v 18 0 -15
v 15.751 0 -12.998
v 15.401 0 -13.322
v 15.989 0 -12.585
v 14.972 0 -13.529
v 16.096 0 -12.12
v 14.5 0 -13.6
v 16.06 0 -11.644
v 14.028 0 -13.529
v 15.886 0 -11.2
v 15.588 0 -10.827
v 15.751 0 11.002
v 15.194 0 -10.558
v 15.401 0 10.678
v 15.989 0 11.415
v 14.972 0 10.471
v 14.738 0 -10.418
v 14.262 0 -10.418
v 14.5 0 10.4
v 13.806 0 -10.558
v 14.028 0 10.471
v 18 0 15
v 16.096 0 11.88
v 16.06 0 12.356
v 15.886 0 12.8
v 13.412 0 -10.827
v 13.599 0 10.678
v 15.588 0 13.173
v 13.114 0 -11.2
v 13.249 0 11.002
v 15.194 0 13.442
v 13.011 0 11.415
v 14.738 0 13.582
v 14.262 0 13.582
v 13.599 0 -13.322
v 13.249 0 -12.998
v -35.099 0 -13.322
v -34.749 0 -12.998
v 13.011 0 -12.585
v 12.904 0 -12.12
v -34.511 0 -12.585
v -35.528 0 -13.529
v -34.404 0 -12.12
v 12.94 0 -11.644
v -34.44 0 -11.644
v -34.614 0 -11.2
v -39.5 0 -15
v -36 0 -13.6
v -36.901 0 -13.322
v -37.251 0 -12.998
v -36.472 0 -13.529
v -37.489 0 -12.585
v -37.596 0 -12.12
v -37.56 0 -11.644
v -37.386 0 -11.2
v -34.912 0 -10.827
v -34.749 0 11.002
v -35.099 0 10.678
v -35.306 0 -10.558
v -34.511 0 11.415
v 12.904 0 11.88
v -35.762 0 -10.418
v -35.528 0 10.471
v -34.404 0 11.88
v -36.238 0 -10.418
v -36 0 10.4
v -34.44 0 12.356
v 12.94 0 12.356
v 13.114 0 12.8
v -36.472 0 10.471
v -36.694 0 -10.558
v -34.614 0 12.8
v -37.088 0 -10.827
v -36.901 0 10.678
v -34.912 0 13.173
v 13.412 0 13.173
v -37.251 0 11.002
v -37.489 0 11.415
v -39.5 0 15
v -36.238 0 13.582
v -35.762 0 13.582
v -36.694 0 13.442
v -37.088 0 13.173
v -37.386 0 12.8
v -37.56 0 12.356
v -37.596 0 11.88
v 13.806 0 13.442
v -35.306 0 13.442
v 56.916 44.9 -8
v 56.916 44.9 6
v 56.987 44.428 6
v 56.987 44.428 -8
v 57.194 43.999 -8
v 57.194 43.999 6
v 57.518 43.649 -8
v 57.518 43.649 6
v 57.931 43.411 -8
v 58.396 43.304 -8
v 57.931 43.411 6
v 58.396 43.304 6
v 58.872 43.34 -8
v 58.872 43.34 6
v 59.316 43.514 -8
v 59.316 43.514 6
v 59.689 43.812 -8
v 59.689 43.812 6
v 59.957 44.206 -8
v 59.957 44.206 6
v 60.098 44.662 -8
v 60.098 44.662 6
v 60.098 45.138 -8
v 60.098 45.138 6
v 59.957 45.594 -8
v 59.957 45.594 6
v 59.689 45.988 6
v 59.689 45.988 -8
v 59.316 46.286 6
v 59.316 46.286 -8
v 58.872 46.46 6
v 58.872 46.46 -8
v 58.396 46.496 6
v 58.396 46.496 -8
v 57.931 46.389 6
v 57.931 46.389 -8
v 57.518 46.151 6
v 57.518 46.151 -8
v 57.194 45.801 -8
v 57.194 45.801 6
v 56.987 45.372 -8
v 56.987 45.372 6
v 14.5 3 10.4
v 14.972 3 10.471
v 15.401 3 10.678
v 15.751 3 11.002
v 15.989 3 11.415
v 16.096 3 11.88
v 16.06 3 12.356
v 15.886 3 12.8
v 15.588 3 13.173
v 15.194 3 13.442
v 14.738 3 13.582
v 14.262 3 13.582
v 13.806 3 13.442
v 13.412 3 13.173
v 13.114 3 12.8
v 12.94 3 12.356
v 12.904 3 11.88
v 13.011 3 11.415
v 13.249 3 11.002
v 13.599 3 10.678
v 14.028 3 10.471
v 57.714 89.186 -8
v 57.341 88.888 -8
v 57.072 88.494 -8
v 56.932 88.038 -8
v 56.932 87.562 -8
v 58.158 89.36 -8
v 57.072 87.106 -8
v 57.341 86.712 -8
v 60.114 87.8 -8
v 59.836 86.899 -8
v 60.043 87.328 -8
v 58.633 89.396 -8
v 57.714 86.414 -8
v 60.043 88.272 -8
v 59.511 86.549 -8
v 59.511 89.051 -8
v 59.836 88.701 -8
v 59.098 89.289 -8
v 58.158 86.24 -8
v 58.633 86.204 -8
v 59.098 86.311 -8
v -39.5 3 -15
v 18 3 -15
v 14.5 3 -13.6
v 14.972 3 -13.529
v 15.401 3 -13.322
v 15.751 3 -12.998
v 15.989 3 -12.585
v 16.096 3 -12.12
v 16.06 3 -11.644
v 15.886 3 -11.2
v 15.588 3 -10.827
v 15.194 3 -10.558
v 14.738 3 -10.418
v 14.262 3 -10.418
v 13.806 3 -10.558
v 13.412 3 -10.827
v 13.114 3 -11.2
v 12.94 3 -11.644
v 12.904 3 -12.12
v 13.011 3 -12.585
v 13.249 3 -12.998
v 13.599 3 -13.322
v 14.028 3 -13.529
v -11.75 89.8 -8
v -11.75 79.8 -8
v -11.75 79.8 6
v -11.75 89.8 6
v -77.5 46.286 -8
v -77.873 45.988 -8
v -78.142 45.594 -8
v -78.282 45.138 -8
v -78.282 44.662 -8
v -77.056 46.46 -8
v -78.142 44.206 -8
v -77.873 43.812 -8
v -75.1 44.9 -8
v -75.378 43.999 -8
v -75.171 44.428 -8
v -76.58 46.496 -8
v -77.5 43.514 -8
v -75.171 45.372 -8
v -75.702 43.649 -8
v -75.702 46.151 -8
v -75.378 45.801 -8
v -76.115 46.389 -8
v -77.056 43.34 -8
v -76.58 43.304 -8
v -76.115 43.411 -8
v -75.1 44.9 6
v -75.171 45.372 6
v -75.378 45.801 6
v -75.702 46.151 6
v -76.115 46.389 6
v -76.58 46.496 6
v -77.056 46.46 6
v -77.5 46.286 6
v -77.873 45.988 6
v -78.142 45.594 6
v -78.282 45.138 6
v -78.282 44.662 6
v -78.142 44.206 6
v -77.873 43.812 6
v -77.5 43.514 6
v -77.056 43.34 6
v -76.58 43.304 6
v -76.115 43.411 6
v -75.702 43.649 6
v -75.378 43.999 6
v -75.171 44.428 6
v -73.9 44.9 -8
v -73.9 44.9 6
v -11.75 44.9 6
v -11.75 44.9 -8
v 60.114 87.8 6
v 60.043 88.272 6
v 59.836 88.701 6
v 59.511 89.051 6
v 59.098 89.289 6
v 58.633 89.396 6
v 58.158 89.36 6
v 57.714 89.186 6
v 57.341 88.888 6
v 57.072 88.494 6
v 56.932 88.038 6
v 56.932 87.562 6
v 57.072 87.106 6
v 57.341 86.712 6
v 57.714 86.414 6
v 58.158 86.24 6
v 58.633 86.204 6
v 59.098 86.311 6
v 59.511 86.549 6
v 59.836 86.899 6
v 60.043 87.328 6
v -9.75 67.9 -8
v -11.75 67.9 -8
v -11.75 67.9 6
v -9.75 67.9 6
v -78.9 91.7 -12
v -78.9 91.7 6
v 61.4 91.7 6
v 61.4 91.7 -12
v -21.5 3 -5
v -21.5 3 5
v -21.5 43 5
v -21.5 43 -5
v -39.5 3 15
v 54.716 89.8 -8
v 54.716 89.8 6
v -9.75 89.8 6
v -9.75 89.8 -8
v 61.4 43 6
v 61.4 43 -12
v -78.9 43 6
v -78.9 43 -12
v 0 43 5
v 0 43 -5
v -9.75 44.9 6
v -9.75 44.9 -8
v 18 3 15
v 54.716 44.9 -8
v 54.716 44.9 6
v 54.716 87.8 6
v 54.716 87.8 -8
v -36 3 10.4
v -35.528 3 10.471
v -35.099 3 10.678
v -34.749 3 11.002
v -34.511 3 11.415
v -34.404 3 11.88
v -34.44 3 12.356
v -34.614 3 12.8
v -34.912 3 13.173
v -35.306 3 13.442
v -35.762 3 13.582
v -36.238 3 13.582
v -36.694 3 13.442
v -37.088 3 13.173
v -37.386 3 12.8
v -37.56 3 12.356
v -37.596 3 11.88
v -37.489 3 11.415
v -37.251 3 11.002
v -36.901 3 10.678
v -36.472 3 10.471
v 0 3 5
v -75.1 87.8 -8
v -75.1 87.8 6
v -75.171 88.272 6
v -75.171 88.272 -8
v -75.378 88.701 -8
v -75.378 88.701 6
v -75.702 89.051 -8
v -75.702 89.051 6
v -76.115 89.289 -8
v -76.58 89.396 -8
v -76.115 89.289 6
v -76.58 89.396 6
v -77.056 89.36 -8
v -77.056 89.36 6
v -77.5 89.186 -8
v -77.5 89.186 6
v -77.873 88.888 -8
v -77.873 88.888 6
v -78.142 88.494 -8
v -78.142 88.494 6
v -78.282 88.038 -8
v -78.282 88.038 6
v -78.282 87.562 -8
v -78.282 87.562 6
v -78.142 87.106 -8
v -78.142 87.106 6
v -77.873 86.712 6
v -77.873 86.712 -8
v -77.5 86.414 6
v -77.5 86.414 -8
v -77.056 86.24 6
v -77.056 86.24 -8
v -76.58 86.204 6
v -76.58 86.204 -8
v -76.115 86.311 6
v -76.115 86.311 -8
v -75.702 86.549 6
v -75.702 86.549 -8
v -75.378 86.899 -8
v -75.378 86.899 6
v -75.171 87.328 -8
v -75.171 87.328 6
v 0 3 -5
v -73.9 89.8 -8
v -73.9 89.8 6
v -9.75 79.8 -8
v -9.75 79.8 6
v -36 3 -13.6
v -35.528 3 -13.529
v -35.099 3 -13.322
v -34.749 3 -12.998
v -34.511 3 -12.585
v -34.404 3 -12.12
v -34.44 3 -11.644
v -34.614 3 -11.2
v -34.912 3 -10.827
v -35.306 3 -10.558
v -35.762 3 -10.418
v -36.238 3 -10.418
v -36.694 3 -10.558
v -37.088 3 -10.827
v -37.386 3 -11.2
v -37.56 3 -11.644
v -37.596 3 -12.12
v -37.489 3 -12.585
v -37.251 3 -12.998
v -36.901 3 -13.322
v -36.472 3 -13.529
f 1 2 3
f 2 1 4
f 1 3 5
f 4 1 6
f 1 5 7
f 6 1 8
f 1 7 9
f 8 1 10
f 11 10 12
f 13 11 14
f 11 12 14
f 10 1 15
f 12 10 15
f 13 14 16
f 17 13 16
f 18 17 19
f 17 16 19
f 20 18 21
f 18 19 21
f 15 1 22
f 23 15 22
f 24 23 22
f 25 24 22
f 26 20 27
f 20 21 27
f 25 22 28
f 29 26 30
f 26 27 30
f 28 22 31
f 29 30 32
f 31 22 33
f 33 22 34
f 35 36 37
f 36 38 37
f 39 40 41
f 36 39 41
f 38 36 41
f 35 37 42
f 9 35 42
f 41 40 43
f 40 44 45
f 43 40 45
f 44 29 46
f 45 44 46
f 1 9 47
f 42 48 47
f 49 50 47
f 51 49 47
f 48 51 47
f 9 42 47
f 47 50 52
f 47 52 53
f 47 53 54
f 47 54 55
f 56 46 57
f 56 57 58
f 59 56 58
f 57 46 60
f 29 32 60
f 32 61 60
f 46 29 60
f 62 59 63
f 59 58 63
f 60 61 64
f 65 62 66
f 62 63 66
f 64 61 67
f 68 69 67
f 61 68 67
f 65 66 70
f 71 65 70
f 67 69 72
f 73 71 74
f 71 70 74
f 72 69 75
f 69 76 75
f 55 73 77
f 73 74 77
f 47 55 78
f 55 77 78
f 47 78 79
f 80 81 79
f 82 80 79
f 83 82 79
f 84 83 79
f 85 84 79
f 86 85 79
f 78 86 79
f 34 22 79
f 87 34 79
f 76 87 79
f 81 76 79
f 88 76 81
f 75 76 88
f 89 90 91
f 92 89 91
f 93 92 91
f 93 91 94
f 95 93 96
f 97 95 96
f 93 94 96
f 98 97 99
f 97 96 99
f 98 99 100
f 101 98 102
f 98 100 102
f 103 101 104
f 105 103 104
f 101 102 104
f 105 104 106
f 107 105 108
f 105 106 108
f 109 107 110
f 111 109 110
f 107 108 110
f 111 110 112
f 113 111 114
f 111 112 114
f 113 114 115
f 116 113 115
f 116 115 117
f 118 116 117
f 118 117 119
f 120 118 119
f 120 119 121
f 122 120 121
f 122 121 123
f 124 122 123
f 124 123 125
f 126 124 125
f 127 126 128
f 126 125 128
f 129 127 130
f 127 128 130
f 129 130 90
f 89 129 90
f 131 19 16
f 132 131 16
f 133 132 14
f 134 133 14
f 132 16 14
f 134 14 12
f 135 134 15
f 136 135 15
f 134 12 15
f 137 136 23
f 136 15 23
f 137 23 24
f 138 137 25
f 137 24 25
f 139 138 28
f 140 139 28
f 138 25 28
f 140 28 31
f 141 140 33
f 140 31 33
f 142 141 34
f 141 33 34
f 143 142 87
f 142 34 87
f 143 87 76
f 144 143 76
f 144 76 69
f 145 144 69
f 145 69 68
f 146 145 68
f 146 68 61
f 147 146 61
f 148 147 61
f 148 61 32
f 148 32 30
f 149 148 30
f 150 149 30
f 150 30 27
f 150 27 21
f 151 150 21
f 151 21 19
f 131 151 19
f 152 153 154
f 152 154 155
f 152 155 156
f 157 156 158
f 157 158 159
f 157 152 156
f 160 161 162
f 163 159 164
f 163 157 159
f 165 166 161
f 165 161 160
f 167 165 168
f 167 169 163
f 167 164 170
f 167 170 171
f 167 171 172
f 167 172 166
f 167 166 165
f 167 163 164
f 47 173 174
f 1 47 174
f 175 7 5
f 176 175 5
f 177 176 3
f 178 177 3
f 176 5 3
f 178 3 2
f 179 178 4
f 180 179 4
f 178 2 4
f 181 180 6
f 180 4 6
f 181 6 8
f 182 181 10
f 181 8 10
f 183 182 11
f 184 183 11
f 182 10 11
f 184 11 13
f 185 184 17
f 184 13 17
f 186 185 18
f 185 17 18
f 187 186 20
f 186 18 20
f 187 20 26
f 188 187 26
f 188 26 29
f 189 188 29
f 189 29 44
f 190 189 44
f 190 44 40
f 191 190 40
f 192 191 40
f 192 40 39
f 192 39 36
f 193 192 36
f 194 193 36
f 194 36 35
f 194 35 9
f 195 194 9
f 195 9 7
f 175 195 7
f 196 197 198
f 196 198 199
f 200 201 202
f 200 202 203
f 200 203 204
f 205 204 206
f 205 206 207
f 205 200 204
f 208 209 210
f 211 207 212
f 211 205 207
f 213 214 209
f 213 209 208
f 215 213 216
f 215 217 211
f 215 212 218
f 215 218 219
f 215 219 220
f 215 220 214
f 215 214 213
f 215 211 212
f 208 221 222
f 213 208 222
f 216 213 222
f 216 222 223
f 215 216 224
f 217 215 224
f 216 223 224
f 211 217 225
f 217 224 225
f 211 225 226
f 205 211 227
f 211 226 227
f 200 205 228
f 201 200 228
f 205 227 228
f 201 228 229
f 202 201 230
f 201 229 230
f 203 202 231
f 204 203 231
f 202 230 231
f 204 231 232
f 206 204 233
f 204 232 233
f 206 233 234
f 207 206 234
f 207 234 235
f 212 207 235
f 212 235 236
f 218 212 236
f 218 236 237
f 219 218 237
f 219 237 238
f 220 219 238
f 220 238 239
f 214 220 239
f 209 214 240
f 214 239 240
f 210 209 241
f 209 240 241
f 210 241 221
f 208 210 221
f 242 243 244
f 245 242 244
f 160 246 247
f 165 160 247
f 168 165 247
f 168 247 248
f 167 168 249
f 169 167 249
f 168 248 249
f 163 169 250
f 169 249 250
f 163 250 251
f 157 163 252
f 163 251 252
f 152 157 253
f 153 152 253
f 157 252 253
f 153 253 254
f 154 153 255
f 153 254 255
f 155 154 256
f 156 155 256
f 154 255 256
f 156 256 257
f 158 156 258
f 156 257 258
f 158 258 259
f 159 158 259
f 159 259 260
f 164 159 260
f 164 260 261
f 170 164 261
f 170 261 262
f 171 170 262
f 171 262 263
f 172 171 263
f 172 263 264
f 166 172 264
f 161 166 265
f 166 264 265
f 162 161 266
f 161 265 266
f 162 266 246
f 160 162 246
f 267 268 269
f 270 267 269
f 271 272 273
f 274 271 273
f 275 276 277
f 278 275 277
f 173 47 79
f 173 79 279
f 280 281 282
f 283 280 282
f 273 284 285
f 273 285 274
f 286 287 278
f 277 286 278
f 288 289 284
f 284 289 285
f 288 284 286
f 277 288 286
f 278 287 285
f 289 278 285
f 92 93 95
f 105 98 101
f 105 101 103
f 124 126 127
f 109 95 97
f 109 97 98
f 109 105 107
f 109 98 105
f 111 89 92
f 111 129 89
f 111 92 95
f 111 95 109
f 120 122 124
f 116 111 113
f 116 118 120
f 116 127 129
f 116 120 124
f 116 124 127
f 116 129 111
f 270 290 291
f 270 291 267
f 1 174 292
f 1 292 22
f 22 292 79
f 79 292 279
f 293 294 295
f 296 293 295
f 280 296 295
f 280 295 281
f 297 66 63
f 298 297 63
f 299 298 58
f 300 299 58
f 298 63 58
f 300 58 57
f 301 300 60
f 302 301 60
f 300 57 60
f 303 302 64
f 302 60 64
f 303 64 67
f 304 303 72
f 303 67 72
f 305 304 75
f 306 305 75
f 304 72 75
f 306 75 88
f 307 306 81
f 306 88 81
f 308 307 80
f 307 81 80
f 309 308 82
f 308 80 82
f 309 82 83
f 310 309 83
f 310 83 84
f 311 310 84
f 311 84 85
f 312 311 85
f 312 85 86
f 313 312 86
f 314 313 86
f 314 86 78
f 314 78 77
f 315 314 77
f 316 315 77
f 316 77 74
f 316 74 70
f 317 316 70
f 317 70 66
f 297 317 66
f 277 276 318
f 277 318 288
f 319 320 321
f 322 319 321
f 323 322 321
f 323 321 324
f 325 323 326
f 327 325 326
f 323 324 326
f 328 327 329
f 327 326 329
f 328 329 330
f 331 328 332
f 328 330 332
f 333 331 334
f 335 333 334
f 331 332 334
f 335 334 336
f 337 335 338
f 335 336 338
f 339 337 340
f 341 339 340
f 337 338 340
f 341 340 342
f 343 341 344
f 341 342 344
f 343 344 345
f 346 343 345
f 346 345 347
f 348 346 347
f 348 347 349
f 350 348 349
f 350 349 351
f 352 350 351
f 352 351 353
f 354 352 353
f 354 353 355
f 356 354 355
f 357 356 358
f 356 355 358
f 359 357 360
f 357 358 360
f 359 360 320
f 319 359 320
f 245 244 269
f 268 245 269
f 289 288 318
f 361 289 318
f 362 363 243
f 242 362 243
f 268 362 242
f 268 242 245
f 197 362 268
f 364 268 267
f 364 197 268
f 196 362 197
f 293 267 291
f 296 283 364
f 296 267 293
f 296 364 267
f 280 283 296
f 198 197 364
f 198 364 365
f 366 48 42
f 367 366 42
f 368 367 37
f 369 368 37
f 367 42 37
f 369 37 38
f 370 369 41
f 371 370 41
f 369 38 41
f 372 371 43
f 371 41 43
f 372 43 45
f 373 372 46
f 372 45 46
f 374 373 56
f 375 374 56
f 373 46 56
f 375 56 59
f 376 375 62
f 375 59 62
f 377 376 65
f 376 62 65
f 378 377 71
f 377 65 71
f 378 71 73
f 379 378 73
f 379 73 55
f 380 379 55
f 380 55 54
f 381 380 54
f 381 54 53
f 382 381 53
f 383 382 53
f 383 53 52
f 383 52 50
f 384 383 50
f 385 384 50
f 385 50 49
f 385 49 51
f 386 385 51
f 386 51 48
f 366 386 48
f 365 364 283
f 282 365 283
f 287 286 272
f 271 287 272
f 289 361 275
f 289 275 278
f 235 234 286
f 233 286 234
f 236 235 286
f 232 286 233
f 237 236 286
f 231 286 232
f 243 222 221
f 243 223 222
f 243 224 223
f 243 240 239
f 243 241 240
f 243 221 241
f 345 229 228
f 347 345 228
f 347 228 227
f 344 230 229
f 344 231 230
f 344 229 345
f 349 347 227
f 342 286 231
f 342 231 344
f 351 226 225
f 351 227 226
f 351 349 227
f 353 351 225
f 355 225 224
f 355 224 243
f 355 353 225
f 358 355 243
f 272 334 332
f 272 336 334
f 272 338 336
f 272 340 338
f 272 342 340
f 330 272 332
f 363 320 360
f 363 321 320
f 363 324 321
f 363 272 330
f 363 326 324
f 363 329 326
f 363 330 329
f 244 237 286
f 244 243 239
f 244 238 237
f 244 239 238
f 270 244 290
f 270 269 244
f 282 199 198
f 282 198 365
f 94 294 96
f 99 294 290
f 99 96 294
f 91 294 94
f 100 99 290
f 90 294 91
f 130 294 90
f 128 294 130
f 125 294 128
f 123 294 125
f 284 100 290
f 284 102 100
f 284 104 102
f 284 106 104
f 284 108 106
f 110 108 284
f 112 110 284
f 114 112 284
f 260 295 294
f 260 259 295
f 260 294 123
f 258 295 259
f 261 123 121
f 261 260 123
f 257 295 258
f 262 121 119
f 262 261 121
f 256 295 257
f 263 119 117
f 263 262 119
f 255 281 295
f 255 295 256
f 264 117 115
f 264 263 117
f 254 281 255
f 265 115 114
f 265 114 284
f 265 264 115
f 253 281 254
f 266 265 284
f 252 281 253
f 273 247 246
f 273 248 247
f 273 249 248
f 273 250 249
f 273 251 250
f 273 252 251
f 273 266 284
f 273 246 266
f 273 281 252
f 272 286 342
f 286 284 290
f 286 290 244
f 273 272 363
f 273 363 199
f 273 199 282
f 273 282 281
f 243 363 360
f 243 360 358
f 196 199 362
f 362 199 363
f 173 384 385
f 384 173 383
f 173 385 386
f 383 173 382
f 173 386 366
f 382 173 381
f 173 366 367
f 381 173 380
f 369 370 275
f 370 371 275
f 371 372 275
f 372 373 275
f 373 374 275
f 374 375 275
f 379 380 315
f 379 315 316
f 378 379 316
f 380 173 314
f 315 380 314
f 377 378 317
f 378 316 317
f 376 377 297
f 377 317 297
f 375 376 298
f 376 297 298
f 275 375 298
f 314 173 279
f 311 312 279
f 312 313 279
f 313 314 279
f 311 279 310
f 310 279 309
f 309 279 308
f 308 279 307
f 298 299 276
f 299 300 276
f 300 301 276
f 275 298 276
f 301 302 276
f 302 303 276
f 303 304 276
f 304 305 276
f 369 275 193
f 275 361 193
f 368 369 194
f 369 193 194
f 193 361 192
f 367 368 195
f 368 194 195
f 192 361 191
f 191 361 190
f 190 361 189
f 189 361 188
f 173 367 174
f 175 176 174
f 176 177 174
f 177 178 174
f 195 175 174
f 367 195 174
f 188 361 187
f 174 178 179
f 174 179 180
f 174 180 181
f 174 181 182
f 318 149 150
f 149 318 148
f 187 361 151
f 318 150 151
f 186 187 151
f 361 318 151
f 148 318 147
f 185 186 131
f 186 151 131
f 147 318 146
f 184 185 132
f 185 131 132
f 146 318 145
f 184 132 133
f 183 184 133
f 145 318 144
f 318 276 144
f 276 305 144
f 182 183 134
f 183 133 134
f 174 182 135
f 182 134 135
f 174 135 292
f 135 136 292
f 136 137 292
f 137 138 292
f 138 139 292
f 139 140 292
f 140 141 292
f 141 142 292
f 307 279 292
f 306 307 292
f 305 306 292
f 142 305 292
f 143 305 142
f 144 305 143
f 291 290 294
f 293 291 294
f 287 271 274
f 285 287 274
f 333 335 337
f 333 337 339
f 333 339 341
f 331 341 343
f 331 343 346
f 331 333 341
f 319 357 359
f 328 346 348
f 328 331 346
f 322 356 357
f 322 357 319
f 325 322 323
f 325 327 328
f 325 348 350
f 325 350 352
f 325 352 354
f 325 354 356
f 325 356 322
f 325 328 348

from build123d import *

# Parameters (mm, degrees)
SKETCH_1_W               = 126.3
SKETCH_1_H               = 42.9
SKETCH_1_W_2             = 2
SKETCH_1_W_3             = 62.15
EXTRUDE_6_DEPTH          = 15
SKETCH_2_W               = 62.15
SKETCH_2_H               = 42.9
CUT_EXTRUDE_1_DEPTH      = 23
SKETCH_4_W               = 10
SKETCH_4_H               = 40
CUT_EXTRUDE_2_DEPTH      = 159.899905601
CUT_EXTRUDE_3_DEPTH      = 119.456321064
CUT_EXTRUDE_3_DEPTH_BACK = 119.456321064
SKETCH_5_W               = 10
SKETCH_5_H               = 40
CUT_EXTRUDE_4_DEPTH      = 159.899905601
CUT_EXTRUDE_4_DEPTH_BACK = 159.899905601
SKETCH_6_W               = 9
SKETCH_6_H               = 46.7
SKETCH_7_W               = 14
SKETCH_7_H               = 11.9
CUT_EXTRUDE_5_DEPTH      = 23
SKETCH_9_R               = 1.6
CUT_EXTRUDE_6_DEPTH      = 10
CUT_EXTRUDE_7_DEPTH      = 159.899905601
CUT_EXTRUDE_7_DEPTH_BACK = 159.899905601
SKETCH_11_W              = 3
SKETCH_11_H              = 46.7
SKETCH_14_W              = 7
SKETCH_14_H              = 18
EXTRUDE_8_DEPTH          = 46.7
SKETCH_15_W              = 2.315581883
SKETCH_15_H              = 42.9
SKETCH_15_R              = 1.6
CUT_EXTRUDE_9_DEPTH      = 14
SKETCH_19_W              = 3
SKETCH_19_H              = 18
EXTRUDE_9_DEPTH          = 46.7
SKETCH_20_W              = 140.3
SKETCH_20_H              = 2
EXTRUDE_10_DEPTH         = 18
SKETCH_21_R              = 1.6
CUT_EXTRUDE_13_DEPTH     = 14
SKETCH_23_W              = 2
SKETCH_23_H              = 2
EXTRUDE_11_DEPTH         = 14


with BuildPart() as part:
    # 草图1 → 凸台-拉伸6 (new, symmetric)
    # profile 1 of 4: a face of its own
    with BuildSketch(Plane.XY):
        Polygon((-39.5, 0), (-39.5, 3), (-21.5, 3), (-21.5, 43), (-75.9, 43), (-75.9, 89.7), (54.4, 89.7), (54.4, 43), (0, 43), (0, 3), (18, 3), (18, 0), align=None)
        with Locations((-10.75, 66.35)):
            Rectangle(SKETCH_1_W, SKETCH_1_H, mode=Mode.SUBTRACT)
    # profile 2 of 4: a face of its own
    with BuildSketch(Plane.XY):
        with Locations((-10.75, 66.35)):
            Rectangle(SKETCH_1_W_2, SKETCH_1_H)
    # profile 3 of 4: a face of its own
    with BuildSketch(Plane.XY):
        with Locations((21.325, 66.35)):
            Rectangle(SKETCH_1_W_3, SKETCH_1_H)
    # profile 4 of 4: a face of its own
    with BuildSketch(Plane.XY):
        with Locations((-42.825, 66.35)):
            Rectangle(SKETCH_1_W_3, SKETCH_1_H)
    extrude(amount=EXTRUDE_6_DEPTH, both=True)

    # 草图2 → 切除-拉伸1 (cut)
    with BuildSketch(Plane.XY.offset(15)):
        with Locations((-42.825, 66.35)):
            Rectangle(SKETCH_2_W, SKETCH_2_H)
        with Locations((21.325, 66.35)):
            Rectangle(SKETCH_2_W, SKETCH_2_H)
    extrude(amount=-CUT_EXTRUDE_1_DEPTH, mode=Mode.SUBTRACT)

    # 草图4 → 切除-拉伸2 (cut, through all)
    with BuildSketch(Plane.ZY.offset(75.9)):
        with Locations((10, 23)):
            Rectangle(SKETCH_4_W, SKETCH_4_H)
    extrude(amount=-CUT_EXTRUDE_2_DEPTH, mode=Mode.SUBTRACT)

    # 草图5 → 切除-拉伸3 (cut, two sides: drawn at the far end of the back side and taken through both)
    with BuildSketch(Plane.ZY.offset(21.5).offset(-CUT_EXTRUDE_3_DEPTH_BACK)):
        with Locations((-10, 23)):
            Rectangle(SKETCH_5_W, SKETCH_5_H)
    extrude(amount=CUT_EXTRUDE_3_DEPTH + CUT_EXTRUDE_3_DEPTH_BACK, mode=Mode.SUBTRACT)

    # 草图6 → 切除-拉伸4 (cut, two sides: drawn at the far end of the back side and taken through both)
    with BuildSketch(Plane.ZY.offset(75.9).offset(-CUT_EXTRUDE_4_DEPTH_BACK)):
        with Locations((10.5, 66.35)):
            Rectangle(SKETCH_6_W, SKETCH_6_H)
    extrude(amount=CUT_EXTRUDE_4_DEPTH + CUT_EXTRUDE_4_DEPTH_BACK, mode=Mode.SUBTRACT)

    # 草图7 → 切除-拉伸5 (cut)
    with BuildSketch(Plane.ZY.offset(11.75)):
        with Locations((-1, 73.85)):
            Rectangle(SKETCH_7_W, SKETCH_7_H)
    extrude(amount=-CUT_EXTRUDE_5_DEPTH, mode=Mode.SUBTRACT)

    # 草图9 → 切除-拉伸6 (cut)
    with BuildSketch(Plane.XZ):
        with Locations(Location((-36, 12, 0), (0, 0, 270))):
            Circle(SKETCH_9_R)
        with Locations(Location((-36, -12, 0), (0, 0, 270))):
            Circle(SKETCH_9_R)
        with Locations(Location((14.5, 12, 0), (0, 0, 270))):
            Circle(SKETCH_9_R)
        with Locations(Location((14.5, -12, 0), (0, 0, 270))):
            Circle(SKETCH_9_R)
    extrude(amount=-CUT_EXTRUDE_6_DEPTH, mode=Mode.SUBTRACT)

    # 草图11 → 切除-拉伸7 (cut, two sides: drawn at the far end of the back side and taken through both)
    with BuildSketch(Plane.ZY.offset(75.9).offset(-CUT_EXTRUDE_7_DEPTH_BACK)):
        with Locations((-13.5, 66.35)):
            Rectangle(SKETCH_11_W, SKETCH_11_H)
    extrude(amount=CUT_EXTRUDE_7_DEPTH + CUT_EXTRUDE_7_DEPTH_BACK, mode=Mode.SUBTRACT)

    # 草图14 → 凸台-拉伸8 (add)
    with BuildSketch(Plane(origin=(0, 89.7, 0), x_dir=(1, 0, 0), z_dir=(0, 1, 0))):
        with Locations((57.9, 3)):
            Rectangle(SKETCH_14_W, SKETCH_14_H)
    extrude(amount=-EXTRUDE_8_DEPTH)

    # 草图15 → 切除-拉伸9 (cut)
    with BuildSketch(Plane.XY.offset(6)):
        with BuildLine():
            ThreePointArc((60.11573898, 44.9), (58.51573898, 46.5), (56.91573898, 44.9))
            ThreePointArc((56.91573898, 44.9), (58.51573898, 43.3), (60.11573898, 44.9))
        make_face()
        with Locations((53.557790942, 66.35)):
            Rectangle(SKETCH_15_W, SKETCH_15_H)
        Polygon((52.4, 44.9), (52.4, 87.8), (-9.75, 87.8), (-9.75, 79.8), (-11.75, 79.8), (-11.75, 87.8), (-73.9, 87.8), (-73.9, 44.9), (-11.75, 44.9), (-11.75, 67.9), (-9.75, 67.9), (-9.75, 44.9), align=None)
        with Locations((58.51385679, 87.8)):
            Circle(SKETCH_15_R)
    extrude(amount=-CUT_EXTRUDE_9_DEPTH, mode=Mode.SUBTRACT)

    # 草图19 → 凸台-拉伸9 (add)
    with BuildSketch(Plane(origin=(0, 89.7, 0), x_dir=(1, 0, 0), z_dir=(0, 1, 0))):
        with Locations((-77.4, 3)):
            Rectangle(SKETCH_19_W, SKETCH_19_H)
    extrude(amount=-EXTRUDE_9_DEPTH)

    # 草图20 → 凸台-拉伸10 (add)
    with BuildSketch(Plane.XY.offset(6)):
        with Locations((-8.75, 90.7)):
            Rectangle(SKETCH_20_W, SKETCH_20_H)
    extrude(amount=-EXTRUDE_10_DEPTH)

    # 草图21 → 切除-拉伸13 (cut)
    with BuildSketch(Plane.XY.offset(6)):
        with Locations((-76.7, 44.9)):
            Circle(SKETCH_21_R)
        Polygon((-73.9, 89.8), (-73.9, 87.8), (-11.75, 87.8), (54.715581883, 87.8), (54.715581883, 89.8), align=None)
        with Locations((-76.7, 87.8)):
            Circle(SKETCH_21_R)
    extrude(amount=-CUT_EXTRUDE_13_DEPTH, mode=Mode.SUBTRACT)

    # 草图23 → 凸台-拉伸11 (add)
    with BuildSketch(Plane.XY.offset(-8)):
        with Locations((-10.75, 88.8)):
            Rectangle(SKETCH_23_W, SKETCH_23_H)
    extrude(amount=EXTRUDE_11_DEPTH)


solid = part.part
